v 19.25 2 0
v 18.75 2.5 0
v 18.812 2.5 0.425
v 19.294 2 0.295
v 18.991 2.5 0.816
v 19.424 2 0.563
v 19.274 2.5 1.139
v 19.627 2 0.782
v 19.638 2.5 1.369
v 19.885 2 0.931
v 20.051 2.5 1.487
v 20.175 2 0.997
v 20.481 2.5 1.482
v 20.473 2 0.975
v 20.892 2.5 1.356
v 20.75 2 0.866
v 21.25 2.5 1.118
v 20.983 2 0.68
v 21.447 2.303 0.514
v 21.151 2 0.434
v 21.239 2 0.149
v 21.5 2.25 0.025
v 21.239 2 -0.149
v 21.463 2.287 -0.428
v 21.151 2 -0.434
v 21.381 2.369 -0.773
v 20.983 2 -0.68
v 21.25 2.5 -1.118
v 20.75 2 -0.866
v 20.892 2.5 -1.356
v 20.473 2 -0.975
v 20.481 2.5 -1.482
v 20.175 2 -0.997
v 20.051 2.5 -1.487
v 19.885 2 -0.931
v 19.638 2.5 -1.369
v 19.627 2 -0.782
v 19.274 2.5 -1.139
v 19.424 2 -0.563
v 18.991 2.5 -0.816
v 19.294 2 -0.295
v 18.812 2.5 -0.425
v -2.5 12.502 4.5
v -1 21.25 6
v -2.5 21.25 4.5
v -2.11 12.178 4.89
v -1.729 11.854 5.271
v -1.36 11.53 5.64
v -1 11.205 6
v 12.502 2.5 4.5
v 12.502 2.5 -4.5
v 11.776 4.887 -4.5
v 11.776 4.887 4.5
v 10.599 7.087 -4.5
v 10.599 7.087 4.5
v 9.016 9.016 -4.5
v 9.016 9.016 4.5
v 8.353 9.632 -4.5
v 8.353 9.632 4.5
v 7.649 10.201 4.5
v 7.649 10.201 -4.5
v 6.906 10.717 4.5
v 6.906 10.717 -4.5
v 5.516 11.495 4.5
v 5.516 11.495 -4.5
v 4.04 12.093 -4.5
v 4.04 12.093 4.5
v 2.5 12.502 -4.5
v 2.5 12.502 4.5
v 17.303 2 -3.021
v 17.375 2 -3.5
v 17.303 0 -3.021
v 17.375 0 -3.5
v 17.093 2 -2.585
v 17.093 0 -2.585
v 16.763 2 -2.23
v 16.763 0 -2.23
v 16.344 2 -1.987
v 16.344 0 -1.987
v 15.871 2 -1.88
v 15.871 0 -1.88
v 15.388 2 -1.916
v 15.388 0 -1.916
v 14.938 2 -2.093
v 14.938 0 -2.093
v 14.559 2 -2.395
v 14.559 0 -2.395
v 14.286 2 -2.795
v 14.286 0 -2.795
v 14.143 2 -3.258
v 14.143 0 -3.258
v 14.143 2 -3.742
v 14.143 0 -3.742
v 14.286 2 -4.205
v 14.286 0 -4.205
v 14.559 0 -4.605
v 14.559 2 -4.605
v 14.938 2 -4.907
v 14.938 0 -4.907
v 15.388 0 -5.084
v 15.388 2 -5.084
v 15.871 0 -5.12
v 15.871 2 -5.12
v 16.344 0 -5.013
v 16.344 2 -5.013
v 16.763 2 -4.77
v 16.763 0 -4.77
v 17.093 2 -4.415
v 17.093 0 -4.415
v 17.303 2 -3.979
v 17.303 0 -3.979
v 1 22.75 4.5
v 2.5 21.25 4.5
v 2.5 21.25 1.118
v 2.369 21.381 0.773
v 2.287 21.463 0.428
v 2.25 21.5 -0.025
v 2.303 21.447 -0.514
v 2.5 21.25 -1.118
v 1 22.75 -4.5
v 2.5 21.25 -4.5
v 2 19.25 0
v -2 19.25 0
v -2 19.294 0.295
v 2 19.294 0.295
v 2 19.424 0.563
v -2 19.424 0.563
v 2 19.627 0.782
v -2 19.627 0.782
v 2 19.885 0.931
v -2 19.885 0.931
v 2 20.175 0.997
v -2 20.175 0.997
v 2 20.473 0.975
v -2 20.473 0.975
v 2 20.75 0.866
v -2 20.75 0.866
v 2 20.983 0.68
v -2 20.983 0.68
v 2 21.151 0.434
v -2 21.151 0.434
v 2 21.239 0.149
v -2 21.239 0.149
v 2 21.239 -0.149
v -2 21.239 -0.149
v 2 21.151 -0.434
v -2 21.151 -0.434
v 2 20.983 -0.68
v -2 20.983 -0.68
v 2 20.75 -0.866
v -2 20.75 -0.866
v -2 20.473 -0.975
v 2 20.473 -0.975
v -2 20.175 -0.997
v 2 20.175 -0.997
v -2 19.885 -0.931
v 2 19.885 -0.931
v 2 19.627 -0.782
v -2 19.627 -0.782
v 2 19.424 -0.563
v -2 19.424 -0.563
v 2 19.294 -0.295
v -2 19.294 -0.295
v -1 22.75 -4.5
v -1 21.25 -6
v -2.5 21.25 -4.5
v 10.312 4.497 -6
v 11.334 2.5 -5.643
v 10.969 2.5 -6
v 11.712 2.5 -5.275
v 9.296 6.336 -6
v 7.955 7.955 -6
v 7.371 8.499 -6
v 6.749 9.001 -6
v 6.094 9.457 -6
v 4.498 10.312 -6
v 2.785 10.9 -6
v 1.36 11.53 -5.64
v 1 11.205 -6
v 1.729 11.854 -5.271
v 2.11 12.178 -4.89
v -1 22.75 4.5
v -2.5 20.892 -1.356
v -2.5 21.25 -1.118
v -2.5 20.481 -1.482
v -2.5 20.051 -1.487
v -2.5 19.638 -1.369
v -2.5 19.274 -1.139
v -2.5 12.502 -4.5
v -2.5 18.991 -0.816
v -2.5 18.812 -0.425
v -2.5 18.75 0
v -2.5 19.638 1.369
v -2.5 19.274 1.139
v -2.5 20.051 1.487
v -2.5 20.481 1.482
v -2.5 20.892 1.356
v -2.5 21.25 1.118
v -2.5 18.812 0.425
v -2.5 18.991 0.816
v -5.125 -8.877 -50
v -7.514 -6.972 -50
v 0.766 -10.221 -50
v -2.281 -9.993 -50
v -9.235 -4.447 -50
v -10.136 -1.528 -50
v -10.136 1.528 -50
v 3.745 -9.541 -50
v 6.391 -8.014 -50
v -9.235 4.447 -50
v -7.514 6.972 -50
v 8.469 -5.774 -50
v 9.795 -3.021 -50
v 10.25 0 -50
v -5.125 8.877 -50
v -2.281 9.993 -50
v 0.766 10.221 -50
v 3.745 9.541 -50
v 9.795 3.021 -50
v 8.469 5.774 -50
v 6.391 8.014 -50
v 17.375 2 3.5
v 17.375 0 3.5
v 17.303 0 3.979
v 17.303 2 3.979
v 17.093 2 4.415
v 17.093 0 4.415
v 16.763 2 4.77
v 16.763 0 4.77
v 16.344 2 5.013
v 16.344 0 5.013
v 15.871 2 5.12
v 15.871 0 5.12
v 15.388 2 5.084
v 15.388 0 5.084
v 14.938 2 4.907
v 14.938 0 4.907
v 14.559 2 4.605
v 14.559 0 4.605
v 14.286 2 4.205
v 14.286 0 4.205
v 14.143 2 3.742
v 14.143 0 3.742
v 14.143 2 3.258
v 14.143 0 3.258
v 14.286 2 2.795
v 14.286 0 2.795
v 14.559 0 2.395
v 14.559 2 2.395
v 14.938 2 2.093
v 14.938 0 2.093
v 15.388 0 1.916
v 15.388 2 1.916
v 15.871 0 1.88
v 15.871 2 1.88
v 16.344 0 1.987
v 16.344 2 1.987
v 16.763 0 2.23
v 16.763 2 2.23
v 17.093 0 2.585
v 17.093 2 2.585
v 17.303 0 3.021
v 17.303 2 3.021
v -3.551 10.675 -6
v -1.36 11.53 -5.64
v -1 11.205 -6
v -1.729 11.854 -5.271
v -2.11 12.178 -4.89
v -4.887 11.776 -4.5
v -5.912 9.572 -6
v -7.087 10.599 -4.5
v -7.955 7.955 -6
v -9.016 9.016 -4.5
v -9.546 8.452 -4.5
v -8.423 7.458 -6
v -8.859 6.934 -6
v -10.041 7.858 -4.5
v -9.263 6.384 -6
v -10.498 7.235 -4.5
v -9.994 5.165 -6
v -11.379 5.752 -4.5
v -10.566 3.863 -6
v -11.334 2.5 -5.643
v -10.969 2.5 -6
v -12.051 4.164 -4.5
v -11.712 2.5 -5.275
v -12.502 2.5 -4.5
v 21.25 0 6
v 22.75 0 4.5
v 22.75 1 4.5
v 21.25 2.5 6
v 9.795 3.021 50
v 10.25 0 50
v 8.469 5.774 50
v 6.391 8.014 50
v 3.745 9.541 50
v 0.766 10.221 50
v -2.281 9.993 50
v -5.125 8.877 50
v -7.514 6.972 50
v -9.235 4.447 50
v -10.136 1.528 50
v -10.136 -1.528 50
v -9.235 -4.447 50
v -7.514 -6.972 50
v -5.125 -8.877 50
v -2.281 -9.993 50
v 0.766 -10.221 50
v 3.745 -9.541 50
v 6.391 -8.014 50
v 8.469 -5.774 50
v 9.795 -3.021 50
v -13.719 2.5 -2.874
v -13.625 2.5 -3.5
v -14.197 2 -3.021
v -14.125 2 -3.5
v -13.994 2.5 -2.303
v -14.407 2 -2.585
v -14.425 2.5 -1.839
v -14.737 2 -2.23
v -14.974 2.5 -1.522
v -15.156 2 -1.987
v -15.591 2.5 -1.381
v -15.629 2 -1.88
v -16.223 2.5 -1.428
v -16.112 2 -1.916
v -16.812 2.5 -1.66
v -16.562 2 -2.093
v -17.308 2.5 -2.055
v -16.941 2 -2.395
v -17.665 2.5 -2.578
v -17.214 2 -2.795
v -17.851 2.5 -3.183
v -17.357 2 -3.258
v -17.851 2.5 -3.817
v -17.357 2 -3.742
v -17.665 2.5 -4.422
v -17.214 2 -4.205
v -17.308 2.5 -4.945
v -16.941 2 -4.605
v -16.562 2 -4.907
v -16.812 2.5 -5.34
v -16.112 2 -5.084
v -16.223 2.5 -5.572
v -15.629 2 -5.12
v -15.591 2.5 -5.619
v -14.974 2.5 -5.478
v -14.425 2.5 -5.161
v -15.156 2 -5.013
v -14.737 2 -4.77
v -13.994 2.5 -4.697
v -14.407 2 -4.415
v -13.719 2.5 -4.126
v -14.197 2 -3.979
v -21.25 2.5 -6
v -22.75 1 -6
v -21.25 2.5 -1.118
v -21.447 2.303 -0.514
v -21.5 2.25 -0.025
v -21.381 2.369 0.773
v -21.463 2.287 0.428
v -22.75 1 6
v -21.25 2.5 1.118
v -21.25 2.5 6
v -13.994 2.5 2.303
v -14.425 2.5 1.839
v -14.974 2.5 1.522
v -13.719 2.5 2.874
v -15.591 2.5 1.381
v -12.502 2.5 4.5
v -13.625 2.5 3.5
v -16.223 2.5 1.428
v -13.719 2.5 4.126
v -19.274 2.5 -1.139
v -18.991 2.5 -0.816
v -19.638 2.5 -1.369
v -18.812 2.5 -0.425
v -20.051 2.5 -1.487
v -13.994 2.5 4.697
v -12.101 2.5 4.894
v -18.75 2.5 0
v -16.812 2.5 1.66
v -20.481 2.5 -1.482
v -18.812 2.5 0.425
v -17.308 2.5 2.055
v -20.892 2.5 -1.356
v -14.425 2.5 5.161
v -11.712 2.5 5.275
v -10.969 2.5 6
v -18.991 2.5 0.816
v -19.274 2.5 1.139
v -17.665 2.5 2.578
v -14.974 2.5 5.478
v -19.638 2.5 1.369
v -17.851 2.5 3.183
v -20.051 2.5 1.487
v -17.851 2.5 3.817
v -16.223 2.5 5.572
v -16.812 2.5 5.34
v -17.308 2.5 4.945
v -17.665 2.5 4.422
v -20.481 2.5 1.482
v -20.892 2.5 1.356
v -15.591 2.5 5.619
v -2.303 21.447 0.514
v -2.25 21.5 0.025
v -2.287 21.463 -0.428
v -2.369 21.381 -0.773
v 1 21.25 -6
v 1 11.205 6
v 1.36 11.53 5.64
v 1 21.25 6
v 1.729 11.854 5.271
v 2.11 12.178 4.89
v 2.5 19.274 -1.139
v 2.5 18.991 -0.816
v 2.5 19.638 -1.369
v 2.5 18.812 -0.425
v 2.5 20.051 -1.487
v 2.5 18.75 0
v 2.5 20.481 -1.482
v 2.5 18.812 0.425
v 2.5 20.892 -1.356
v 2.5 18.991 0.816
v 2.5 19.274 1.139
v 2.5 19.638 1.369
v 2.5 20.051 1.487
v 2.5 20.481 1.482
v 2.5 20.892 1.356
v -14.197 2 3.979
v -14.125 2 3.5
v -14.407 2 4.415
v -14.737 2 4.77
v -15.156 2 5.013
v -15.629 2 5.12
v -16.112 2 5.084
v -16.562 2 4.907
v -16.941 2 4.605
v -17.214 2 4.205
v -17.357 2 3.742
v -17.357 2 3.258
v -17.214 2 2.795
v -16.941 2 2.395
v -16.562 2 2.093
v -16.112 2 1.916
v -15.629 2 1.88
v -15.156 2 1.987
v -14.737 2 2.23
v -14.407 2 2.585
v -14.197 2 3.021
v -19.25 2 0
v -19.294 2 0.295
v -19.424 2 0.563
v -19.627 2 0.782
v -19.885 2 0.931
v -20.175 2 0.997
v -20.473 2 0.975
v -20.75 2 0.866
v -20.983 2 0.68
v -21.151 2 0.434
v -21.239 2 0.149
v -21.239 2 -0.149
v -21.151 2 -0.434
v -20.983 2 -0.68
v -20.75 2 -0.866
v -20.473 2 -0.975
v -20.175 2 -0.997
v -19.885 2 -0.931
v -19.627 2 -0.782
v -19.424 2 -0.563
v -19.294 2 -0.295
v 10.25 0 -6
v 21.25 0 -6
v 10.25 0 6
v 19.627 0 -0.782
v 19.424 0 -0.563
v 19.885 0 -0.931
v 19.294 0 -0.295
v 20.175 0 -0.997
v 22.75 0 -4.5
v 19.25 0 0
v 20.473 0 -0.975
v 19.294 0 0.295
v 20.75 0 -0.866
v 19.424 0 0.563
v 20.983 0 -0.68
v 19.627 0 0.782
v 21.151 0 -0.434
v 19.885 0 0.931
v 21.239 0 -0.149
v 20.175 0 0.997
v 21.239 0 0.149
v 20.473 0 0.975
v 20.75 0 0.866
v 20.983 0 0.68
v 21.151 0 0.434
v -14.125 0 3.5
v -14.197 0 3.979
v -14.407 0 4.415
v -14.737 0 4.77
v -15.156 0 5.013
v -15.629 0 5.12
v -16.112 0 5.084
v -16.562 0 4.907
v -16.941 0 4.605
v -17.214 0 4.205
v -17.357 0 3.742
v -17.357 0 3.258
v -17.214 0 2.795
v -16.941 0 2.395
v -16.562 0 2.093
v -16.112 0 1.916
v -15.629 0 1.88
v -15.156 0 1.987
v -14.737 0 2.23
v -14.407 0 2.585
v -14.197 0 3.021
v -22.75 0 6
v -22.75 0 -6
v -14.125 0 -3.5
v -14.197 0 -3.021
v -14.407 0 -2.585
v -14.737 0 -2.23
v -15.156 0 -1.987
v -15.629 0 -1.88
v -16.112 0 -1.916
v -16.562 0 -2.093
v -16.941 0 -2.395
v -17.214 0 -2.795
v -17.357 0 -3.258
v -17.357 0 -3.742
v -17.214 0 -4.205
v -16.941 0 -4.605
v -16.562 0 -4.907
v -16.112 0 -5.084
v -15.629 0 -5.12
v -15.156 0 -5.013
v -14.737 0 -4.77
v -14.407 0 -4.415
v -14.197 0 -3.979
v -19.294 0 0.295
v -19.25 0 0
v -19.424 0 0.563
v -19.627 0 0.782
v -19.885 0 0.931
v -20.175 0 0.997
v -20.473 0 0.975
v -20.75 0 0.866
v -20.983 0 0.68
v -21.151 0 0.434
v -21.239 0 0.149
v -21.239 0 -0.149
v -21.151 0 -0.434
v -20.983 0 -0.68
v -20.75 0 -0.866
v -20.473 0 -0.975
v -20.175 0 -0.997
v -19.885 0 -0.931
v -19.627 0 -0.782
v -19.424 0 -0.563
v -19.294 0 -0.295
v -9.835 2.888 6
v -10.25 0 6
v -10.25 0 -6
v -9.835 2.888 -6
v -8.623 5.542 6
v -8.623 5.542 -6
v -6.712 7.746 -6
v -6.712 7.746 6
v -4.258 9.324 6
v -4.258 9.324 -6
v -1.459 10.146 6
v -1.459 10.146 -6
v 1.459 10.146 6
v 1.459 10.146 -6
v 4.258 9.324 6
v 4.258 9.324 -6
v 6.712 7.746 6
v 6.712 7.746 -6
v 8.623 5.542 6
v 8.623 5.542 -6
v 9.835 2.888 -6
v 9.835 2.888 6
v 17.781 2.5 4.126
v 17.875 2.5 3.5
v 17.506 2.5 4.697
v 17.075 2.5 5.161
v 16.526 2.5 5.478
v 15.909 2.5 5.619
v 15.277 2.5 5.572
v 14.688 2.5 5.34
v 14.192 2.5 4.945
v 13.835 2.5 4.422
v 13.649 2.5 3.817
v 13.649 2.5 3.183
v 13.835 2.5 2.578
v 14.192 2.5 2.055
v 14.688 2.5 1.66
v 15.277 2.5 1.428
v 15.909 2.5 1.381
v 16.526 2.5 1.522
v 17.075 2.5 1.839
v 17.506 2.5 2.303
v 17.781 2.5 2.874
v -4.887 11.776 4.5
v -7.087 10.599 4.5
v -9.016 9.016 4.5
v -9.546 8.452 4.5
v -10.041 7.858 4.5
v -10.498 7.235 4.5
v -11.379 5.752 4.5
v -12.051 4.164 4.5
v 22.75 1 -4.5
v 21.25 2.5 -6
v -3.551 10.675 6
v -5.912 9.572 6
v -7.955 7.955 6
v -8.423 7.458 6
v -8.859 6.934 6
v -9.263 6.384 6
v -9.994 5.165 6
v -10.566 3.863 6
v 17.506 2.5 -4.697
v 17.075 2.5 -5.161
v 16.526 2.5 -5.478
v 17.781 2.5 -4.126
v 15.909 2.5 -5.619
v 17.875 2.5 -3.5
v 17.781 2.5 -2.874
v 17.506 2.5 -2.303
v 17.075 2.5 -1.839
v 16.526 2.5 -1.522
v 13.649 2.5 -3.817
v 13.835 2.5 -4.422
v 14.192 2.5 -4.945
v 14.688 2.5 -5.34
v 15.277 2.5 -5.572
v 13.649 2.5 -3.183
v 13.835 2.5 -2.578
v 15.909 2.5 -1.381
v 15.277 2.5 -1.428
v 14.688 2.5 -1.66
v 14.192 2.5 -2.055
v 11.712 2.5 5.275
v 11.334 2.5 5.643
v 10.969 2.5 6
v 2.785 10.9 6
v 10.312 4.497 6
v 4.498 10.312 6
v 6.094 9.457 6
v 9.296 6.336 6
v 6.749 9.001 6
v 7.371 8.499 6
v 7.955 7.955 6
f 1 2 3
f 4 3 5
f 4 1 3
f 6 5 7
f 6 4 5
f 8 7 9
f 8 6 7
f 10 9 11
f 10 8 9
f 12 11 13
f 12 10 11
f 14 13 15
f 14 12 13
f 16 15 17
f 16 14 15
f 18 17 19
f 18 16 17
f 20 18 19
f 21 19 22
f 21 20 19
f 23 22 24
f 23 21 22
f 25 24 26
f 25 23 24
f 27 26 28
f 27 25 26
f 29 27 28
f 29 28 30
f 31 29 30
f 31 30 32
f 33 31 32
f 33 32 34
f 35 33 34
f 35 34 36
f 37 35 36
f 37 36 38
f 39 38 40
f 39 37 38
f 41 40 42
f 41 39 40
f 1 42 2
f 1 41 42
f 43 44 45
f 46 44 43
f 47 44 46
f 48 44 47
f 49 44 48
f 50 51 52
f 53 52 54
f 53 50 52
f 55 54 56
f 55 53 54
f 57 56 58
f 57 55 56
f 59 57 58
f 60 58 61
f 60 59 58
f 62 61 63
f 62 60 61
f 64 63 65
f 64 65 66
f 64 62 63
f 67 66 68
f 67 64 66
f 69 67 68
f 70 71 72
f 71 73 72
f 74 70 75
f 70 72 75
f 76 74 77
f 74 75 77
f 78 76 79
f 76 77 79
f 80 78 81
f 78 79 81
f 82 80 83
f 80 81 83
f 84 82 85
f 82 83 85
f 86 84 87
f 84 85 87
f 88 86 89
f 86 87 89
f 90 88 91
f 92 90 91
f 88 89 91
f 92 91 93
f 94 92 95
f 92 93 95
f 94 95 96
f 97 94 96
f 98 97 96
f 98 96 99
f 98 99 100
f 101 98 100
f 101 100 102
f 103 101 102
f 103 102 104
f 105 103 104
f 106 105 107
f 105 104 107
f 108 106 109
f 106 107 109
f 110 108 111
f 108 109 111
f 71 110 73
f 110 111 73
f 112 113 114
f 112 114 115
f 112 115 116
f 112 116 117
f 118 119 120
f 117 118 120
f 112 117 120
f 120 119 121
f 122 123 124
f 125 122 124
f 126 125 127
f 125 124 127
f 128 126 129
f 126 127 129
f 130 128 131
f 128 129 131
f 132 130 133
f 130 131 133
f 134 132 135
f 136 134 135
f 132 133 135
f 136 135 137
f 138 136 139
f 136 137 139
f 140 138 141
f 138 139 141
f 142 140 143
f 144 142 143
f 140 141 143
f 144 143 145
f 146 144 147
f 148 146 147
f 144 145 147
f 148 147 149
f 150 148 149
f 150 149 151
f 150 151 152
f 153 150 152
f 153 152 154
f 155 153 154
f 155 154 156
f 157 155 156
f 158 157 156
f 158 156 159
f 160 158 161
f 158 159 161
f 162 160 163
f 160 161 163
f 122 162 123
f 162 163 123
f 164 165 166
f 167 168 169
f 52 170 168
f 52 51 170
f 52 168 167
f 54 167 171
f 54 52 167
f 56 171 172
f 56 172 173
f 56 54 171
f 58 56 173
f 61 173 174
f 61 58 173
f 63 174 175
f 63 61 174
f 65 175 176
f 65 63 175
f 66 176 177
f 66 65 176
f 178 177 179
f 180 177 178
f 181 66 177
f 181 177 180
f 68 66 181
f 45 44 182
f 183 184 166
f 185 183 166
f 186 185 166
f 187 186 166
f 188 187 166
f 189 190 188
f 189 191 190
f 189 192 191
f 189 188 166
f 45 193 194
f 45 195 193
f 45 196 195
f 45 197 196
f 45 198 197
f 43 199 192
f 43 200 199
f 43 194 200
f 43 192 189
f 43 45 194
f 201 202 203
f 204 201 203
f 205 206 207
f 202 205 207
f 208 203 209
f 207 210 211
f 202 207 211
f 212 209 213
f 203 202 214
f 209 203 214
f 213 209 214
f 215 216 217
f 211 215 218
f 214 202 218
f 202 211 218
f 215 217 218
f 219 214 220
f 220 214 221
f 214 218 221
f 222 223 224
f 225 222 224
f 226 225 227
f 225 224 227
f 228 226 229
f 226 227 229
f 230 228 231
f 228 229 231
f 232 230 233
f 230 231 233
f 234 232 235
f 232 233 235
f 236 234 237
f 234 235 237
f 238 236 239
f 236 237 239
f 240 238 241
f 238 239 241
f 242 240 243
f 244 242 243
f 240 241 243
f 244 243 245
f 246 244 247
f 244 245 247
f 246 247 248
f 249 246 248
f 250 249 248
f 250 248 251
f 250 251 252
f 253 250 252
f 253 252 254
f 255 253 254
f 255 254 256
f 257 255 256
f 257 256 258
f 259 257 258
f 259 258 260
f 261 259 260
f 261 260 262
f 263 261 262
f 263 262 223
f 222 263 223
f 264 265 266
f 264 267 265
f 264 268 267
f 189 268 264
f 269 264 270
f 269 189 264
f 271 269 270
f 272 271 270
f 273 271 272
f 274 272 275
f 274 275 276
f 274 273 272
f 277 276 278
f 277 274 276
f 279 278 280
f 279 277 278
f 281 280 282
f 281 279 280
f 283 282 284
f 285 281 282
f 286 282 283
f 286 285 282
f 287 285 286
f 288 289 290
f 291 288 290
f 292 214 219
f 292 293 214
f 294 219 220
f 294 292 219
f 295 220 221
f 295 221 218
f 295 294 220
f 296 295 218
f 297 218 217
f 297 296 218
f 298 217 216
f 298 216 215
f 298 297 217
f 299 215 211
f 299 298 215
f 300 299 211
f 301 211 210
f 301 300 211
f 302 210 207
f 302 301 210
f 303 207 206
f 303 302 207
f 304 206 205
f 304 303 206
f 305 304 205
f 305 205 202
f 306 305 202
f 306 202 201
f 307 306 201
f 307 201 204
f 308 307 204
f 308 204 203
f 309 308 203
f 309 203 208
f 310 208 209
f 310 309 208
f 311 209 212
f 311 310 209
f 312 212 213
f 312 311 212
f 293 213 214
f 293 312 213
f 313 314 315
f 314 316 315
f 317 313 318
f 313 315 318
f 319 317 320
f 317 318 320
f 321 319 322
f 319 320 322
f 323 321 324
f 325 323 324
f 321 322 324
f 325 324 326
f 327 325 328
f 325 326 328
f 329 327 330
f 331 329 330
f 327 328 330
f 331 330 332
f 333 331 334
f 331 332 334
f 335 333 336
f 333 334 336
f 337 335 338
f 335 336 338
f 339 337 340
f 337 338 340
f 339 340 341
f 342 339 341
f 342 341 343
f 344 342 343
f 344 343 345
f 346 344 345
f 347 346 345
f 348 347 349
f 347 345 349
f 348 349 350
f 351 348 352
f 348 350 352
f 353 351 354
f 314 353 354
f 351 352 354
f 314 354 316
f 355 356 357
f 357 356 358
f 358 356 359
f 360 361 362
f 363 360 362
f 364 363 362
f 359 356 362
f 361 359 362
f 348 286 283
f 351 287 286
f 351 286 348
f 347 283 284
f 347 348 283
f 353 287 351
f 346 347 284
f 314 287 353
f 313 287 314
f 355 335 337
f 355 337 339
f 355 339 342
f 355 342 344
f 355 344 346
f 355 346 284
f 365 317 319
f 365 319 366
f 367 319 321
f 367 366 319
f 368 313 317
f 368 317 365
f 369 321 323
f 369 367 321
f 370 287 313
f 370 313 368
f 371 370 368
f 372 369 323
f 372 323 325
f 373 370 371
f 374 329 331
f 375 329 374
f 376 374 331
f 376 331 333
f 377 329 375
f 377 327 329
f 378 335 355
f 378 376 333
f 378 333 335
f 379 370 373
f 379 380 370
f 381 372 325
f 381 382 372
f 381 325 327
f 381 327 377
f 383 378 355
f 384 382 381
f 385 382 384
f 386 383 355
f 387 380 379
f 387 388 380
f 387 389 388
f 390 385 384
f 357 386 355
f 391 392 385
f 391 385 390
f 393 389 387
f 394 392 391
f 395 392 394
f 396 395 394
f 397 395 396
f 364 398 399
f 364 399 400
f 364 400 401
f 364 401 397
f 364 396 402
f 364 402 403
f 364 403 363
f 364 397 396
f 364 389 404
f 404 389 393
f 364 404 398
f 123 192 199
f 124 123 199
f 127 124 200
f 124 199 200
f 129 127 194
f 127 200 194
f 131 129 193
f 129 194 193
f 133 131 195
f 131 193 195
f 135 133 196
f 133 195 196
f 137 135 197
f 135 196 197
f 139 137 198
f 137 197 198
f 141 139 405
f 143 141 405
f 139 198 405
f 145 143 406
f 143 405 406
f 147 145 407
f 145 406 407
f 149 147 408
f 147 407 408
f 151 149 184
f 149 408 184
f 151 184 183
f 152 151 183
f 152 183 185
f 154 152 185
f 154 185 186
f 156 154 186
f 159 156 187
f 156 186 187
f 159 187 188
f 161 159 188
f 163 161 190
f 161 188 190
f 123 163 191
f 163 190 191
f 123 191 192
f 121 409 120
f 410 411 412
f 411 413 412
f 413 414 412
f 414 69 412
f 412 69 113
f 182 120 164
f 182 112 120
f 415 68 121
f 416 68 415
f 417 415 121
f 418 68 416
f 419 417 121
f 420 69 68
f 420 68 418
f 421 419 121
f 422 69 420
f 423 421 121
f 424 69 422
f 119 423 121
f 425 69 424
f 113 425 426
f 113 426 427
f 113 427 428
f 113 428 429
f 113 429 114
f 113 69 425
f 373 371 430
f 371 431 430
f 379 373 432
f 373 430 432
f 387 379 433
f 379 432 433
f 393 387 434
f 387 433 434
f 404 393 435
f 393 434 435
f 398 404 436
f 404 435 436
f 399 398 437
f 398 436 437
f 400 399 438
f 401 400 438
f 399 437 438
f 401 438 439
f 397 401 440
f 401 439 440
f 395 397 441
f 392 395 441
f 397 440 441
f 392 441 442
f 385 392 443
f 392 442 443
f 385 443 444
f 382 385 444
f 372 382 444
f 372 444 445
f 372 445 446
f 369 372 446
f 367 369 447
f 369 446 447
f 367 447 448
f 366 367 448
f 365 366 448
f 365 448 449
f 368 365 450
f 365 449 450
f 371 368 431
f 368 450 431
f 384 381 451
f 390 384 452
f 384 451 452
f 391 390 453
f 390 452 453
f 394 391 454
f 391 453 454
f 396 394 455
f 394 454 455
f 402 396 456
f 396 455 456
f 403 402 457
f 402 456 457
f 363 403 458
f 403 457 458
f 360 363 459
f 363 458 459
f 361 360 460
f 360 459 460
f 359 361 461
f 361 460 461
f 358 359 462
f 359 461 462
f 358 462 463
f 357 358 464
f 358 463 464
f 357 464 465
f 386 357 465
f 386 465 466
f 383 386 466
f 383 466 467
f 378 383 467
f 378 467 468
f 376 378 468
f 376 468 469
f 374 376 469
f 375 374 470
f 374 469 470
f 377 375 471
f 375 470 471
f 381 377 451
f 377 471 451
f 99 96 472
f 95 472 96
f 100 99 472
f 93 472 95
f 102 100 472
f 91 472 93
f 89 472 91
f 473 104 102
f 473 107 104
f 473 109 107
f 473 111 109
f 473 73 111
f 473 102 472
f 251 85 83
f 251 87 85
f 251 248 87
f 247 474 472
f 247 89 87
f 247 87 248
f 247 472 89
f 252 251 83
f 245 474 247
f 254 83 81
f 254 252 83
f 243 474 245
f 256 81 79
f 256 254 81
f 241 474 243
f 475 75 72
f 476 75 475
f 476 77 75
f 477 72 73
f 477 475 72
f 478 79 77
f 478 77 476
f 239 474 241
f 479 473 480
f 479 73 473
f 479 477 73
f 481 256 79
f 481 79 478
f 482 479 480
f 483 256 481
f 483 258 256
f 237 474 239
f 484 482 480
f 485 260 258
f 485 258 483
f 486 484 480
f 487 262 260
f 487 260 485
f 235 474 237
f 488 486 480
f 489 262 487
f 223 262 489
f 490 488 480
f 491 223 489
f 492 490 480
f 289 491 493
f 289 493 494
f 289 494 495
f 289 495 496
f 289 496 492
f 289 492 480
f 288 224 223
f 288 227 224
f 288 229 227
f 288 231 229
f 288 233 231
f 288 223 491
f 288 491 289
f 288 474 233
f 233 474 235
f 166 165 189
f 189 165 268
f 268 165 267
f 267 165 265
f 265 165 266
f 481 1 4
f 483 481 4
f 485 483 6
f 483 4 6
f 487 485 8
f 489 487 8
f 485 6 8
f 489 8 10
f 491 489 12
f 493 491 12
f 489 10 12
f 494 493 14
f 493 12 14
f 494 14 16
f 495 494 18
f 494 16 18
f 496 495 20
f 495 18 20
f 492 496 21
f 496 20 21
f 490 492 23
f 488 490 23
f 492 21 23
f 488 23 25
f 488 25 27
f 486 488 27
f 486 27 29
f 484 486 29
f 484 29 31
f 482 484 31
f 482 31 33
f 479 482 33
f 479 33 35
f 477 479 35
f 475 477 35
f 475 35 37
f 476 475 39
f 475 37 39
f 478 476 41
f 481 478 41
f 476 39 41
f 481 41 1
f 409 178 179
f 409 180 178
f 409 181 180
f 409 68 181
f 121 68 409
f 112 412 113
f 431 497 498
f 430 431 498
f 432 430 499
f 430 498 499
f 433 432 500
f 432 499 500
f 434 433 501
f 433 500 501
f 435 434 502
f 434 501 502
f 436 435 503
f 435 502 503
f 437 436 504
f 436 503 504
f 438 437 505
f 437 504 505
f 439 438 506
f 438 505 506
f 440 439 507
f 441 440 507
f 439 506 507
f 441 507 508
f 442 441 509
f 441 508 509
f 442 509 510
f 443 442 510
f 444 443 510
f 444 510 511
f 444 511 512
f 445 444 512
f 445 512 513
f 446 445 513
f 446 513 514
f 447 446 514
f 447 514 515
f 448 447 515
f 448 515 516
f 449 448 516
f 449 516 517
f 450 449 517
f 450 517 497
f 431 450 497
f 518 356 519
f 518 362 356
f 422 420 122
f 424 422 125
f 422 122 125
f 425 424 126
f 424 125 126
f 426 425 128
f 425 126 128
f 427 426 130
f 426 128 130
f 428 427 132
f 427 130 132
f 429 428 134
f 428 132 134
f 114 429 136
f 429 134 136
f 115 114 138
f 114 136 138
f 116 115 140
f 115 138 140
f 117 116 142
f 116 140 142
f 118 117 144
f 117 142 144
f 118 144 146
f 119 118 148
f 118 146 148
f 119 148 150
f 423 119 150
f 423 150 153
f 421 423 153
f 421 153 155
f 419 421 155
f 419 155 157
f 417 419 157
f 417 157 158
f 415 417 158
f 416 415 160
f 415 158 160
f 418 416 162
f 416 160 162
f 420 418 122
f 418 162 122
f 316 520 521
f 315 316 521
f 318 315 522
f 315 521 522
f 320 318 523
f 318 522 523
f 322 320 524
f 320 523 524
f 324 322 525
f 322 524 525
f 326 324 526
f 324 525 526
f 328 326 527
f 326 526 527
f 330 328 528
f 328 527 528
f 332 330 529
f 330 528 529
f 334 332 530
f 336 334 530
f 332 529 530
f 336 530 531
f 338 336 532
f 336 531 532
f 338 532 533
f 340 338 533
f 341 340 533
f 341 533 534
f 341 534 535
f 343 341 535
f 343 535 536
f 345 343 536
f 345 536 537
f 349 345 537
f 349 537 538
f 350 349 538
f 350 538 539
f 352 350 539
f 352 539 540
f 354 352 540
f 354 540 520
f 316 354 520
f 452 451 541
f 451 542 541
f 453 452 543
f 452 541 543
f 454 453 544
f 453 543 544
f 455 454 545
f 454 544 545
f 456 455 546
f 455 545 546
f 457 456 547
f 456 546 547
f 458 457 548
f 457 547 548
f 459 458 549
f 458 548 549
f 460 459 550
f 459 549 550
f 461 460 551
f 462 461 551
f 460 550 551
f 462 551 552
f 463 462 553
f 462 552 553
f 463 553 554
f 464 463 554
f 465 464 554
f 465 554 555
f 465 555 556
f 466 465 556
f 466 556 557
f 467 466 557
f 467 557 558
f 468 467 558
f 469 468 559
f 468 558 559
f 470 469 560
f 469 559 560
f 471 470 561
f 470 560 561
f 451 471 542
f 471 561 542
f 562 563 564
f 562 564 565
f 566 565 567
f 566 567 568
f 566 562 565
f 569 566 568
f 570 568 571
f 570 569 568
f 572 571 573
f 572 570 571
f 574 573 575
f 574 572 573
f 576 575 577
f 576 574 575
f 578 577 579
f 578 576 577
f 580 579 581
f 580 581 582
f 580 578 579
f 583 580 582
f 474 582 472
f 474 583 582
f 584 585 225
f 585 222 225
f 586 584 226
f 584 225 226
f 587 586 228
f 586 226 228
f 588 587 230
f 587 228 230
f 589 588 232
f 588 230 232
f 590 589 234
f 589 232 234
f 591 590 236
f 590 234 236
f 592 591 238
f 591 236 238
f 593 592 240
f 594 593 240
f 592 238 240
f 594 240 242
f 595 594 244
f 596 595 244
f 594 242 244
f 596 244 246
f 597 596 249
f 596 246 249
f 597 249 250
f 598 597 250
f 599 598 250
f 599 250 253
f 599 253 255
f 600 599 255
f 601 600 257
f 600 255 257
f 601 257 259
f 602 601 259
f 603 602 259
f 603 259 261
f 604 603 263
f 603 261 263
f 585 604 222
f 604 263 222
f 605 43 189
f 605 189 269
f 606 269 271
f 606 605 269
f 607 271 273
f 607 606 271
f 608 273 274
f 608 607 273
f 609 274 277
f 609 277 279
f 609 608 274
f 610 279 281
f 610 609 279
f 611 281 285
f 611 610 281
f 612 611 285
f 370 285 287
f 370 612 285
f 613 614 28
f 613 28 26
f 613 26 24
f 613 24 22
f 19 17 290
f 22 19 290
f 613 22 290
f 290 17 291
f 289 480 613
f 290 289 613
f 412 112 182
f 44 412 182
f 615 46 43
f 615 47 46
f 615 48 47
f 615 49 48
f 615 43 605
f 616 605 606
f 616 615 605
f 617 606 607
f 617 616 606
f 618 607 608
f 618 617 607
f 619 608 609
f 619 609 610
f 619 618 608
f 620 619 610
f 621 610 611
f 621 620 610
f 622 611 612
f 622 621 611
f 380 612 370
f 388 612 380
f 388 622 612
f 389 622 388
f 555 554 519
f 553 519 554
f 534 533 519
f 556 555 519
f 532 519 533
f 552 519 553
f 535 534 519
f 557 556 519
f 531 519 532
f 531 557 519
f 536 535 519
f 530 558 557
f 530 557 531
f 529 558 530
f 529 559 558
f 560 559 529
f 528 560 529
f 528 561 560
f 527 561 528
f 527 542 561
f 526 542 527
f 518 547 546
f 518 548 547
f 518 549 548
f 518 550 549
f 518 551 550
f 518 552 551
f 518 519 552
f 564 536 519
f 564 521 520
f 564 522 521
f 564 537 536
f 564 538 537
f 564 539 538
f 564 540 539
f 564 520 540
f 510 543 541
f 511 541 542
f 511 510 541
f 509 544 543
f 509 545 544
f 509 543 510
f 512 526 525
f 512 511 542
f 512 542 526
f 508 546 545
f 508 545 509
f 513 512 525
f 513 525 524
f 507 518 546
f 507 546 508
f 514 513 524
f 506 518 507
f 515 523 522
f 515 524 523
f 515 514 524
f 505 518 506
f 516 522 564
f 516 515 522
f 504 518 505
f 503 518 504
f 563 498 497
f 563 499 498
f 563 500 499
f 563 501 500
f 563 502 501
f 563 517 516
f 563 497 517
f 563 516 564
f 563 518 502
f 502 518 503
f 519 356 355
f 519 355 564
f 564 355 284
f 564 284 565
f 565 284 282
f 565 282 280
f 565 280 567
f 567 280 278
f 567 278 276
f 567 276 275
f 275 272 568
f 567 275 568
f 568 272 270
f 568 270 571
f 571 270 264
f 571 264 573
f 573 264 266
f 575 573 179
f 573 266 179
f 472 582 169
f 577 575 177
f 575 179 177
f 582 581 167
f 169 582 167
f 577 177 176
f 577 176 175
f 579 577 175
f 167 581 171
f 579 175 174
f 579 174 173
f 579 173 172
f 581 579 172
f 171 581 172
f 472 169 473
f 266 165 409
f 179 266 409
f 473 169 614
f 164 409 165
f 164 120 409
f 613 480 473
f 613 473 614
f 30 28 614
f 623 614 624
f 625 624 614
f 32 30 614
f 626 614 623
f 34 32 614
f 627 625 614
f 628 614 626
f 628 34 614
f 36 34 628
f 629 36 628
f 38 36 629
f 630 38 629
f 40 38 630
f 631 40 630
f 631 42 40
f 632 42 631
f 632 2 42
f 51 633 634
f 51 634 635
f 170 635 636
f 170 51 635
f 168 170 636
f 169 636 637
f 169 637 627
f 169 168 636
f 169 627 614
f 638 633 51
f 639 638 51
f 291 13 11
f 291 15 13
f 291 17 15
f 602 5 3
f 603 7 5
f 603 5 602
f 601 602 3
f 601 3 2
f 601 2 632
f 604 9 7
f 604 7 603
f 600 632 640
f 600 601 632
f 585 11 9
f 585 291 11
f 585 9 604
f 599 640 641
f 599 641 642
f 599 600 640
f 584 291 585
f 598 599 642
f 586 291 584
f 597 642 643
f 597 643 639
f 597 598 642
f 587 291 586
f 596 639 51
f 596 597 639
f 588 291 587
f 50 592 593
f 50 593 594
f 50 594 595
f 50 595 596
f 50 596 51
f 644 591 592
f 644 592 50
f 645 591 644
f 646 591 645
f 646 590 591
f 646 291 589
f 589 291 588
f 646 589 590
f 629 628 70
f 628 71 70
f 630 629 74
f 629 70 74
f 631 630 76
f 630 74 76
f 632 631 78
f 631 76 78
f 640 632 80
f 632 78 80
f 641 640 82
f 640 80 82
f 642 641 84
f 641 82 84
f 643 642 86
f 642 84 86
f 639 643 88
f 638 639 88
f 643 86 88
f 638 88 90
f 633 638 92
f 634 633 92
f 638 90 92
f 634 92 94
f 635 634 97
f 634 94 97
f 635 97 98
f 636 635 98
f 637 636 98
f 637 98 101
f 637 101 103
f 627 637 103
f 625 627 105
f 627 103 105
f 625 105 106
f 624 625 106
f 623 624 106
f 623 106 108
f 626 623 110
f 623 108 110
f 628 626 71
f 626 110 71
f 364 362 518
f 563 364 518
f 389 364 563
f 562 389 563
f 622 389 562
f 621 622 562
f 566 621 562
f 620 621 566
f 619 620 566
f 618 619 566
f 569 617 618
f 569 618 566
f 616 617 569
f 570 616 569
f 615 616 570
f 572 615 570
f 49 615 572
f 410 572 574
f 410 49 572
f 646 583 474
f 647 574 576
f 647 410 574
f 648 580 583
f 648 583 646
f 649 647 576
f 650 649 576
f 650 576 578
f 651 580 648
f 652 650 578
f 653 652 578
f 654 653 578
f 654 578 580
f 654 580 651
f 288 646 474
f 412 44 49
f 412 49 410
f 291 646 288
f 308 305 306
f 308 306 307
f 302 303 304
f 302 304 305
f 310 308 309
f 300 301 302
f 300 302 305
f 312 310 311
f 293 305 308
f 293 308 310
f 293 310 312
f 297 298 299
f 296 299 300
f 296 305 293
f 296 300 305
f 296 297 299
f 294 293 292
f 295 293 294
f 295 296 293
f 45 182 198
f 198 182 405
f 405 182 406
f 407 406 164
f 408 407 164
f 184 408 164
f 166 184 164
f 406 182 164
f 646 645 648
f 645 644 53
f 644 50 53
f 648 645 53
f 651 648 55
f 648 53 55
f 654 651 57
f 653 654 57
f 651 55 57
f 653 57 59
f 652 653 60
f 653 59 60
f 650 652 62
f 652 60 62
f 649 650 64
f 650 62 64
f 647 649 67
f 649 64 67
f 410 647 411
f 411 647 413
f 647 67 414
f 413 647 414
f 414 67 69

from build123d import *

# Parameters (mm, degrees)
F0_R     = 10.25
F1_DEPTH = 50
F3_DEPTH = 6
F4_R     = 1.625
F5_DEPTH = 12.5
F4_R_2   = 1
F6_DEPTH = 12.5
F7_COUNT = 4
F10_SIZE = 1.49999


# Not quite as in the source:
# - a fillet or chamfer that OpenCascade refuses, or shapes differently, is made with other operations: its cross-section is extruded or revolved along the edge and cut away or added
# - a fillet or chamfer is up to 0.001 mm smaller than in the source, because OpenCascade refuses the exact size


with BuildPart() as f1:
    # F0 (on Top) → F1 (new body, symmetric)
    with BuildSketch(Plane.XY):
        Circle(F0_R)
    extrude(amount=F1_DEPTH, both=True)


with BuildPart() as f3:
    # F2 (on Top) → F3 (new body, symmetric)
    with BuildSketch(Plane.XY):
        with BuildLine():
            Line((-2.5, 22.75), (-2.5, 12.50249975))
            ThreePointArc((-2.5, 12.50249975), (-1.2561107011, 12.6879740663), (0, 12.75))
            Line((0, 12.75), (0, 22.75))
            Line((0, 22.75), (-2.5, 22.75))
        make_face()
        with BuildLine():
            ThreePointArc((0, 12.75), (1.2561107011, 12.6879740663), (2.5, 12.50249975))
            Line((2.5, 12.50249975), (2.5, 22.75))
            Line((2.5, 22.75), (0, 22.75))
            Line((0, 22.75), (0, 12.75))
        make_face()
        with BuildLine():
            Line((-12.75, 0), (-10.25, 0))
            ThreePointArc((-10.25, 0), (0, 10.25), (10.25, 0))
            Line((10.25, 0), (12.75, 0))
            ThreePointArc((12.75, 0), (12.6879740663, 1.2561107011), (12.50249975, 2.5))
            ThreePointArc((12.50249975, 2.5), (11.7416340406, 4.9695603484), (10.4984525255, 7.2349840753))
            ThreePointArc((10.4984525255, 7.2349840753), (9.7975676461, 8.1590543705), (9.0156114601, 9.0156114601))
            ThreePointArc((9.0156114601, 9.0156114601), (8.0063926665, 9.9227101373), (6.9064852098, 10.7174139627))
            ThreePointArc((6.9064852098, 10.7174139627), (4.7871832864, 11.817164473), (2.5, 12.50249975))
            ThreePointArc((2.5, 12.50249975), (1.2561107011, 12.6879740663), (0, 12.75))
            ThreePointArc((0, 12.75), (-1.2561107011, 12.6879740663), (-2.5, 12.50249975))
            ThreePointArc((-2.5, 12.50249975), (-4.7871832864, 11.817164473), (-6.9064852098, 10.7174139627))
            ThreePointArc((-6.9064852098, 10.7174139627), (-8.0063926665, 9.9227101373), (-9.0156114601, 9.0156114601))
            ThreePointArc((-9.0156114601, 9.0156114601), (-9.7975676461, 8.1590543705), (-10.4984525255, 7.2349840753))
            ThreePointArc((-10.4984525255, 7.2349840753), (-11.7416340406, 4.9695603484), (-12.50249975, 2.5))
            ThreePointArc((-12.50249975, 2.5), (-12.6879740663, 1.2561107011), (-12.75, 0))
        make_face()
        with BuildLine():
            ThreePointArc((12.50249975, 2.5), (12.6879740663, 1.2561107011), (12.75, 0))
            Line((12.75, 0), (22.75, 0))
            Line((22.75, 0), (22.75, 2.5))
            Line((22.75, 2.5), (12.50249975, 2.5))
        make_face()
        with BuildLine():
            Line((-22.75, 0), (-12.75, 0))
            ThreePointArc((-12.75, 0), (-12.6879740663, 1.2561107011), (-12.50249975, 2.5))
            Line((-12.50249975, 2.5), (-22.75, 2.5))
            Line((-22.75, 2.5), (-22.75, 0))
        make_face()
    extrude(amount=F3_DEPTH, both=True)

    # F4 (on face) → F5 (cut, symmetric)
    with BuildSketch(Plane.XZ):
        with Locations((-15.75, 3.5)):
            Circle(F4_R)
        with Locations((-15.75, -3.5)):
            Circle(F4_R)
        with Locations((15.75, 3.5)):
            Circle(F4_R)
        with Locations((15.75, -3.5)):
            Circle(F4_R)
    extrude(amount=F5_DEPTH, both=True, mode=Mode.SUBTRACT)


with BuildPart() as f6:
    # F4 (on face) → F6 (new body, symmetric)
    with BuildSketch(Plane.XZ):
        with Locations((-20.25, 0)):
            Circle(F4_R_2)
    extrude(amount=F6_DEPTH, both=True)


with BuildPart() as f7_1:
    # F7: instance of F6
    add(f6.part.rotate(Axis((0, 0, 50), (0, 0, 1)), 1 * 360 / F7_COUNT))


with BuildPart() as f7_2:
    # F7: instance of F6
    add(f6.part.rotate(Axis((0, 0, 50), (0, 0, 1)), 2 * 360 / F7_COUNT))


with BuildPart() as f7_3:
    # F7: instance of F6
    add(f6.part.rotate(Axis((0, 0, 50), (0, 0, 1)), 3 * 360 / F7_COUNT))


with BuildPart() as f3_1:
    add(f3.part)

    # F9: cut F7_3, F6, F7_2
    add(f7_3.part, mode=Mode.SUBTRACT)
    add(f6.part, mode=Mode.SUBTRACT)
    add(f7_2.part, mode=Mode.SUBTRACT)

    # F10 (size 1.5 in the source; OpenCascade refuses exactly that, so slightly less here)
    f10_edges = [f3_1.edges().sort_by_distance(p)[0] for p in [
        (22.75, 1.25, 6),
        (22.75, 1.25, -6),
        (0, 22.75, -6),
        (0, 22.75, 6),
        (2.5, 17.62625, 6),
        (-2.5, 17.62625, 6),
        (9.015611, 9.015611, 6),
        (-9.015611, 9.015611, 6),
        (-9.015611, 9.015611, -6),
        (-2.5, 17.62625, -6),
        (2.5, 17.62625, -6),
        (9.015611, 9.015611, -6),
        (-2.5, 22.75, 0),
        (2.5, 22.75, 0),
        (-22.75, 2.5, 0),
        (22.75, 2.5, 0),
    ]]
    chamfer(f10_edges, length=F10_SIZE)

    # F11: chamfer of 0.5 on 8 edges, made by hand

    # F11_s1 → F11_t2 (revolve, cut)
    with BuildSketch(Plane.XY):
        Polygon((18.75, 2.5), (19.25, 2), (19.25, 2.5), align=None)
    revolve(axis=Axis((20.25, 2.5, 0), (0, 1, 0)), mode=Mode.SUBTRACT)

    # F11_s3 → F11_t4 (revolve, cut)
    with BuildSketch(Plane.XY):
        Polygon((2.5, 18.75), (2, 19.25), (2.5, 19.25), align=None)
    revolve(axis=Axis((2.5, 20.25, 0), (-1, 0, 0)), mode=Mode.SUBTRACT)

    # F11_s5 → F11_t6 (revolve, cut)
    with BuildSketch(Plane.XY):
        Polygon((-2, 19.25), (-2.5, 18.75), (-2.5, 19.25), align=None)
    revolve(axis=Axis((-2.5, 20.25, 0), (-1, 0, 0)), mode=Mode.SUBTRACT)

    # F11_s7 → F11_t8 (revolve, cut)
    with BuildSketch(Plane.XY.offset(3.5)):
        Polygon((17.875, 2.5), (17.375, 2), (17.375, 2.5), align=None)
    revolve(axis=Axis((15.75, 2.5, 3.5), (0, -1, 0)), mode=Mode.SUBTRACT)

    # F11_s9 → F11_t10 (revolve, cut)
    with BuildSketch(Plane.XY.offset(-3.5)):
        Polygon((17.875, 2.5), (17.375, 2), (17.375, 2.5), align=None)
    revolve(axis=Axis((15.75, 2.5, -3.5), (0, -1, 0)), mode=Mode.SUBTRACT)

    # F11_s11 → F11_t12 (revolve, cut)
    with BuildSketch(Plane.XY.offset(-3.5)):
        Polygon((-13.625, 2.5), (-14.125, 2), (-14.125, 2.5), align=None)
    revolve(axis=Axis((-15.75, 2.5, -3.5), (0, -1, 0)), mode=Mode.SUBTRACT)

    # F11_s13 → F11_t14 (revolve, cut)
    with BuildSketch(Plane.XY.offset(3.5)):
        Polygon((-13.625, 2.5), (-14.125, 2), (-14.125, 2.5), align=None)
    revolve(axis=Axis((-15.75, 2.5, 3.5), (0, -1, 0)), mode=Mode.SUBTRACT)

    # F11_s15 → F11_t16 (revolve, cut)
    with BuildSketch(Plane.XY):
        Polygon((-18.75, 2.5), (-19.25, 2), (-19.25, 2.5), align=None)
    revolve(axis=Axis((-20.25, 2.5, 0), (0, -1, 0)), mode=Mode.SUBTRACT)


solid = Compound([f1.part, f3_1.part])
